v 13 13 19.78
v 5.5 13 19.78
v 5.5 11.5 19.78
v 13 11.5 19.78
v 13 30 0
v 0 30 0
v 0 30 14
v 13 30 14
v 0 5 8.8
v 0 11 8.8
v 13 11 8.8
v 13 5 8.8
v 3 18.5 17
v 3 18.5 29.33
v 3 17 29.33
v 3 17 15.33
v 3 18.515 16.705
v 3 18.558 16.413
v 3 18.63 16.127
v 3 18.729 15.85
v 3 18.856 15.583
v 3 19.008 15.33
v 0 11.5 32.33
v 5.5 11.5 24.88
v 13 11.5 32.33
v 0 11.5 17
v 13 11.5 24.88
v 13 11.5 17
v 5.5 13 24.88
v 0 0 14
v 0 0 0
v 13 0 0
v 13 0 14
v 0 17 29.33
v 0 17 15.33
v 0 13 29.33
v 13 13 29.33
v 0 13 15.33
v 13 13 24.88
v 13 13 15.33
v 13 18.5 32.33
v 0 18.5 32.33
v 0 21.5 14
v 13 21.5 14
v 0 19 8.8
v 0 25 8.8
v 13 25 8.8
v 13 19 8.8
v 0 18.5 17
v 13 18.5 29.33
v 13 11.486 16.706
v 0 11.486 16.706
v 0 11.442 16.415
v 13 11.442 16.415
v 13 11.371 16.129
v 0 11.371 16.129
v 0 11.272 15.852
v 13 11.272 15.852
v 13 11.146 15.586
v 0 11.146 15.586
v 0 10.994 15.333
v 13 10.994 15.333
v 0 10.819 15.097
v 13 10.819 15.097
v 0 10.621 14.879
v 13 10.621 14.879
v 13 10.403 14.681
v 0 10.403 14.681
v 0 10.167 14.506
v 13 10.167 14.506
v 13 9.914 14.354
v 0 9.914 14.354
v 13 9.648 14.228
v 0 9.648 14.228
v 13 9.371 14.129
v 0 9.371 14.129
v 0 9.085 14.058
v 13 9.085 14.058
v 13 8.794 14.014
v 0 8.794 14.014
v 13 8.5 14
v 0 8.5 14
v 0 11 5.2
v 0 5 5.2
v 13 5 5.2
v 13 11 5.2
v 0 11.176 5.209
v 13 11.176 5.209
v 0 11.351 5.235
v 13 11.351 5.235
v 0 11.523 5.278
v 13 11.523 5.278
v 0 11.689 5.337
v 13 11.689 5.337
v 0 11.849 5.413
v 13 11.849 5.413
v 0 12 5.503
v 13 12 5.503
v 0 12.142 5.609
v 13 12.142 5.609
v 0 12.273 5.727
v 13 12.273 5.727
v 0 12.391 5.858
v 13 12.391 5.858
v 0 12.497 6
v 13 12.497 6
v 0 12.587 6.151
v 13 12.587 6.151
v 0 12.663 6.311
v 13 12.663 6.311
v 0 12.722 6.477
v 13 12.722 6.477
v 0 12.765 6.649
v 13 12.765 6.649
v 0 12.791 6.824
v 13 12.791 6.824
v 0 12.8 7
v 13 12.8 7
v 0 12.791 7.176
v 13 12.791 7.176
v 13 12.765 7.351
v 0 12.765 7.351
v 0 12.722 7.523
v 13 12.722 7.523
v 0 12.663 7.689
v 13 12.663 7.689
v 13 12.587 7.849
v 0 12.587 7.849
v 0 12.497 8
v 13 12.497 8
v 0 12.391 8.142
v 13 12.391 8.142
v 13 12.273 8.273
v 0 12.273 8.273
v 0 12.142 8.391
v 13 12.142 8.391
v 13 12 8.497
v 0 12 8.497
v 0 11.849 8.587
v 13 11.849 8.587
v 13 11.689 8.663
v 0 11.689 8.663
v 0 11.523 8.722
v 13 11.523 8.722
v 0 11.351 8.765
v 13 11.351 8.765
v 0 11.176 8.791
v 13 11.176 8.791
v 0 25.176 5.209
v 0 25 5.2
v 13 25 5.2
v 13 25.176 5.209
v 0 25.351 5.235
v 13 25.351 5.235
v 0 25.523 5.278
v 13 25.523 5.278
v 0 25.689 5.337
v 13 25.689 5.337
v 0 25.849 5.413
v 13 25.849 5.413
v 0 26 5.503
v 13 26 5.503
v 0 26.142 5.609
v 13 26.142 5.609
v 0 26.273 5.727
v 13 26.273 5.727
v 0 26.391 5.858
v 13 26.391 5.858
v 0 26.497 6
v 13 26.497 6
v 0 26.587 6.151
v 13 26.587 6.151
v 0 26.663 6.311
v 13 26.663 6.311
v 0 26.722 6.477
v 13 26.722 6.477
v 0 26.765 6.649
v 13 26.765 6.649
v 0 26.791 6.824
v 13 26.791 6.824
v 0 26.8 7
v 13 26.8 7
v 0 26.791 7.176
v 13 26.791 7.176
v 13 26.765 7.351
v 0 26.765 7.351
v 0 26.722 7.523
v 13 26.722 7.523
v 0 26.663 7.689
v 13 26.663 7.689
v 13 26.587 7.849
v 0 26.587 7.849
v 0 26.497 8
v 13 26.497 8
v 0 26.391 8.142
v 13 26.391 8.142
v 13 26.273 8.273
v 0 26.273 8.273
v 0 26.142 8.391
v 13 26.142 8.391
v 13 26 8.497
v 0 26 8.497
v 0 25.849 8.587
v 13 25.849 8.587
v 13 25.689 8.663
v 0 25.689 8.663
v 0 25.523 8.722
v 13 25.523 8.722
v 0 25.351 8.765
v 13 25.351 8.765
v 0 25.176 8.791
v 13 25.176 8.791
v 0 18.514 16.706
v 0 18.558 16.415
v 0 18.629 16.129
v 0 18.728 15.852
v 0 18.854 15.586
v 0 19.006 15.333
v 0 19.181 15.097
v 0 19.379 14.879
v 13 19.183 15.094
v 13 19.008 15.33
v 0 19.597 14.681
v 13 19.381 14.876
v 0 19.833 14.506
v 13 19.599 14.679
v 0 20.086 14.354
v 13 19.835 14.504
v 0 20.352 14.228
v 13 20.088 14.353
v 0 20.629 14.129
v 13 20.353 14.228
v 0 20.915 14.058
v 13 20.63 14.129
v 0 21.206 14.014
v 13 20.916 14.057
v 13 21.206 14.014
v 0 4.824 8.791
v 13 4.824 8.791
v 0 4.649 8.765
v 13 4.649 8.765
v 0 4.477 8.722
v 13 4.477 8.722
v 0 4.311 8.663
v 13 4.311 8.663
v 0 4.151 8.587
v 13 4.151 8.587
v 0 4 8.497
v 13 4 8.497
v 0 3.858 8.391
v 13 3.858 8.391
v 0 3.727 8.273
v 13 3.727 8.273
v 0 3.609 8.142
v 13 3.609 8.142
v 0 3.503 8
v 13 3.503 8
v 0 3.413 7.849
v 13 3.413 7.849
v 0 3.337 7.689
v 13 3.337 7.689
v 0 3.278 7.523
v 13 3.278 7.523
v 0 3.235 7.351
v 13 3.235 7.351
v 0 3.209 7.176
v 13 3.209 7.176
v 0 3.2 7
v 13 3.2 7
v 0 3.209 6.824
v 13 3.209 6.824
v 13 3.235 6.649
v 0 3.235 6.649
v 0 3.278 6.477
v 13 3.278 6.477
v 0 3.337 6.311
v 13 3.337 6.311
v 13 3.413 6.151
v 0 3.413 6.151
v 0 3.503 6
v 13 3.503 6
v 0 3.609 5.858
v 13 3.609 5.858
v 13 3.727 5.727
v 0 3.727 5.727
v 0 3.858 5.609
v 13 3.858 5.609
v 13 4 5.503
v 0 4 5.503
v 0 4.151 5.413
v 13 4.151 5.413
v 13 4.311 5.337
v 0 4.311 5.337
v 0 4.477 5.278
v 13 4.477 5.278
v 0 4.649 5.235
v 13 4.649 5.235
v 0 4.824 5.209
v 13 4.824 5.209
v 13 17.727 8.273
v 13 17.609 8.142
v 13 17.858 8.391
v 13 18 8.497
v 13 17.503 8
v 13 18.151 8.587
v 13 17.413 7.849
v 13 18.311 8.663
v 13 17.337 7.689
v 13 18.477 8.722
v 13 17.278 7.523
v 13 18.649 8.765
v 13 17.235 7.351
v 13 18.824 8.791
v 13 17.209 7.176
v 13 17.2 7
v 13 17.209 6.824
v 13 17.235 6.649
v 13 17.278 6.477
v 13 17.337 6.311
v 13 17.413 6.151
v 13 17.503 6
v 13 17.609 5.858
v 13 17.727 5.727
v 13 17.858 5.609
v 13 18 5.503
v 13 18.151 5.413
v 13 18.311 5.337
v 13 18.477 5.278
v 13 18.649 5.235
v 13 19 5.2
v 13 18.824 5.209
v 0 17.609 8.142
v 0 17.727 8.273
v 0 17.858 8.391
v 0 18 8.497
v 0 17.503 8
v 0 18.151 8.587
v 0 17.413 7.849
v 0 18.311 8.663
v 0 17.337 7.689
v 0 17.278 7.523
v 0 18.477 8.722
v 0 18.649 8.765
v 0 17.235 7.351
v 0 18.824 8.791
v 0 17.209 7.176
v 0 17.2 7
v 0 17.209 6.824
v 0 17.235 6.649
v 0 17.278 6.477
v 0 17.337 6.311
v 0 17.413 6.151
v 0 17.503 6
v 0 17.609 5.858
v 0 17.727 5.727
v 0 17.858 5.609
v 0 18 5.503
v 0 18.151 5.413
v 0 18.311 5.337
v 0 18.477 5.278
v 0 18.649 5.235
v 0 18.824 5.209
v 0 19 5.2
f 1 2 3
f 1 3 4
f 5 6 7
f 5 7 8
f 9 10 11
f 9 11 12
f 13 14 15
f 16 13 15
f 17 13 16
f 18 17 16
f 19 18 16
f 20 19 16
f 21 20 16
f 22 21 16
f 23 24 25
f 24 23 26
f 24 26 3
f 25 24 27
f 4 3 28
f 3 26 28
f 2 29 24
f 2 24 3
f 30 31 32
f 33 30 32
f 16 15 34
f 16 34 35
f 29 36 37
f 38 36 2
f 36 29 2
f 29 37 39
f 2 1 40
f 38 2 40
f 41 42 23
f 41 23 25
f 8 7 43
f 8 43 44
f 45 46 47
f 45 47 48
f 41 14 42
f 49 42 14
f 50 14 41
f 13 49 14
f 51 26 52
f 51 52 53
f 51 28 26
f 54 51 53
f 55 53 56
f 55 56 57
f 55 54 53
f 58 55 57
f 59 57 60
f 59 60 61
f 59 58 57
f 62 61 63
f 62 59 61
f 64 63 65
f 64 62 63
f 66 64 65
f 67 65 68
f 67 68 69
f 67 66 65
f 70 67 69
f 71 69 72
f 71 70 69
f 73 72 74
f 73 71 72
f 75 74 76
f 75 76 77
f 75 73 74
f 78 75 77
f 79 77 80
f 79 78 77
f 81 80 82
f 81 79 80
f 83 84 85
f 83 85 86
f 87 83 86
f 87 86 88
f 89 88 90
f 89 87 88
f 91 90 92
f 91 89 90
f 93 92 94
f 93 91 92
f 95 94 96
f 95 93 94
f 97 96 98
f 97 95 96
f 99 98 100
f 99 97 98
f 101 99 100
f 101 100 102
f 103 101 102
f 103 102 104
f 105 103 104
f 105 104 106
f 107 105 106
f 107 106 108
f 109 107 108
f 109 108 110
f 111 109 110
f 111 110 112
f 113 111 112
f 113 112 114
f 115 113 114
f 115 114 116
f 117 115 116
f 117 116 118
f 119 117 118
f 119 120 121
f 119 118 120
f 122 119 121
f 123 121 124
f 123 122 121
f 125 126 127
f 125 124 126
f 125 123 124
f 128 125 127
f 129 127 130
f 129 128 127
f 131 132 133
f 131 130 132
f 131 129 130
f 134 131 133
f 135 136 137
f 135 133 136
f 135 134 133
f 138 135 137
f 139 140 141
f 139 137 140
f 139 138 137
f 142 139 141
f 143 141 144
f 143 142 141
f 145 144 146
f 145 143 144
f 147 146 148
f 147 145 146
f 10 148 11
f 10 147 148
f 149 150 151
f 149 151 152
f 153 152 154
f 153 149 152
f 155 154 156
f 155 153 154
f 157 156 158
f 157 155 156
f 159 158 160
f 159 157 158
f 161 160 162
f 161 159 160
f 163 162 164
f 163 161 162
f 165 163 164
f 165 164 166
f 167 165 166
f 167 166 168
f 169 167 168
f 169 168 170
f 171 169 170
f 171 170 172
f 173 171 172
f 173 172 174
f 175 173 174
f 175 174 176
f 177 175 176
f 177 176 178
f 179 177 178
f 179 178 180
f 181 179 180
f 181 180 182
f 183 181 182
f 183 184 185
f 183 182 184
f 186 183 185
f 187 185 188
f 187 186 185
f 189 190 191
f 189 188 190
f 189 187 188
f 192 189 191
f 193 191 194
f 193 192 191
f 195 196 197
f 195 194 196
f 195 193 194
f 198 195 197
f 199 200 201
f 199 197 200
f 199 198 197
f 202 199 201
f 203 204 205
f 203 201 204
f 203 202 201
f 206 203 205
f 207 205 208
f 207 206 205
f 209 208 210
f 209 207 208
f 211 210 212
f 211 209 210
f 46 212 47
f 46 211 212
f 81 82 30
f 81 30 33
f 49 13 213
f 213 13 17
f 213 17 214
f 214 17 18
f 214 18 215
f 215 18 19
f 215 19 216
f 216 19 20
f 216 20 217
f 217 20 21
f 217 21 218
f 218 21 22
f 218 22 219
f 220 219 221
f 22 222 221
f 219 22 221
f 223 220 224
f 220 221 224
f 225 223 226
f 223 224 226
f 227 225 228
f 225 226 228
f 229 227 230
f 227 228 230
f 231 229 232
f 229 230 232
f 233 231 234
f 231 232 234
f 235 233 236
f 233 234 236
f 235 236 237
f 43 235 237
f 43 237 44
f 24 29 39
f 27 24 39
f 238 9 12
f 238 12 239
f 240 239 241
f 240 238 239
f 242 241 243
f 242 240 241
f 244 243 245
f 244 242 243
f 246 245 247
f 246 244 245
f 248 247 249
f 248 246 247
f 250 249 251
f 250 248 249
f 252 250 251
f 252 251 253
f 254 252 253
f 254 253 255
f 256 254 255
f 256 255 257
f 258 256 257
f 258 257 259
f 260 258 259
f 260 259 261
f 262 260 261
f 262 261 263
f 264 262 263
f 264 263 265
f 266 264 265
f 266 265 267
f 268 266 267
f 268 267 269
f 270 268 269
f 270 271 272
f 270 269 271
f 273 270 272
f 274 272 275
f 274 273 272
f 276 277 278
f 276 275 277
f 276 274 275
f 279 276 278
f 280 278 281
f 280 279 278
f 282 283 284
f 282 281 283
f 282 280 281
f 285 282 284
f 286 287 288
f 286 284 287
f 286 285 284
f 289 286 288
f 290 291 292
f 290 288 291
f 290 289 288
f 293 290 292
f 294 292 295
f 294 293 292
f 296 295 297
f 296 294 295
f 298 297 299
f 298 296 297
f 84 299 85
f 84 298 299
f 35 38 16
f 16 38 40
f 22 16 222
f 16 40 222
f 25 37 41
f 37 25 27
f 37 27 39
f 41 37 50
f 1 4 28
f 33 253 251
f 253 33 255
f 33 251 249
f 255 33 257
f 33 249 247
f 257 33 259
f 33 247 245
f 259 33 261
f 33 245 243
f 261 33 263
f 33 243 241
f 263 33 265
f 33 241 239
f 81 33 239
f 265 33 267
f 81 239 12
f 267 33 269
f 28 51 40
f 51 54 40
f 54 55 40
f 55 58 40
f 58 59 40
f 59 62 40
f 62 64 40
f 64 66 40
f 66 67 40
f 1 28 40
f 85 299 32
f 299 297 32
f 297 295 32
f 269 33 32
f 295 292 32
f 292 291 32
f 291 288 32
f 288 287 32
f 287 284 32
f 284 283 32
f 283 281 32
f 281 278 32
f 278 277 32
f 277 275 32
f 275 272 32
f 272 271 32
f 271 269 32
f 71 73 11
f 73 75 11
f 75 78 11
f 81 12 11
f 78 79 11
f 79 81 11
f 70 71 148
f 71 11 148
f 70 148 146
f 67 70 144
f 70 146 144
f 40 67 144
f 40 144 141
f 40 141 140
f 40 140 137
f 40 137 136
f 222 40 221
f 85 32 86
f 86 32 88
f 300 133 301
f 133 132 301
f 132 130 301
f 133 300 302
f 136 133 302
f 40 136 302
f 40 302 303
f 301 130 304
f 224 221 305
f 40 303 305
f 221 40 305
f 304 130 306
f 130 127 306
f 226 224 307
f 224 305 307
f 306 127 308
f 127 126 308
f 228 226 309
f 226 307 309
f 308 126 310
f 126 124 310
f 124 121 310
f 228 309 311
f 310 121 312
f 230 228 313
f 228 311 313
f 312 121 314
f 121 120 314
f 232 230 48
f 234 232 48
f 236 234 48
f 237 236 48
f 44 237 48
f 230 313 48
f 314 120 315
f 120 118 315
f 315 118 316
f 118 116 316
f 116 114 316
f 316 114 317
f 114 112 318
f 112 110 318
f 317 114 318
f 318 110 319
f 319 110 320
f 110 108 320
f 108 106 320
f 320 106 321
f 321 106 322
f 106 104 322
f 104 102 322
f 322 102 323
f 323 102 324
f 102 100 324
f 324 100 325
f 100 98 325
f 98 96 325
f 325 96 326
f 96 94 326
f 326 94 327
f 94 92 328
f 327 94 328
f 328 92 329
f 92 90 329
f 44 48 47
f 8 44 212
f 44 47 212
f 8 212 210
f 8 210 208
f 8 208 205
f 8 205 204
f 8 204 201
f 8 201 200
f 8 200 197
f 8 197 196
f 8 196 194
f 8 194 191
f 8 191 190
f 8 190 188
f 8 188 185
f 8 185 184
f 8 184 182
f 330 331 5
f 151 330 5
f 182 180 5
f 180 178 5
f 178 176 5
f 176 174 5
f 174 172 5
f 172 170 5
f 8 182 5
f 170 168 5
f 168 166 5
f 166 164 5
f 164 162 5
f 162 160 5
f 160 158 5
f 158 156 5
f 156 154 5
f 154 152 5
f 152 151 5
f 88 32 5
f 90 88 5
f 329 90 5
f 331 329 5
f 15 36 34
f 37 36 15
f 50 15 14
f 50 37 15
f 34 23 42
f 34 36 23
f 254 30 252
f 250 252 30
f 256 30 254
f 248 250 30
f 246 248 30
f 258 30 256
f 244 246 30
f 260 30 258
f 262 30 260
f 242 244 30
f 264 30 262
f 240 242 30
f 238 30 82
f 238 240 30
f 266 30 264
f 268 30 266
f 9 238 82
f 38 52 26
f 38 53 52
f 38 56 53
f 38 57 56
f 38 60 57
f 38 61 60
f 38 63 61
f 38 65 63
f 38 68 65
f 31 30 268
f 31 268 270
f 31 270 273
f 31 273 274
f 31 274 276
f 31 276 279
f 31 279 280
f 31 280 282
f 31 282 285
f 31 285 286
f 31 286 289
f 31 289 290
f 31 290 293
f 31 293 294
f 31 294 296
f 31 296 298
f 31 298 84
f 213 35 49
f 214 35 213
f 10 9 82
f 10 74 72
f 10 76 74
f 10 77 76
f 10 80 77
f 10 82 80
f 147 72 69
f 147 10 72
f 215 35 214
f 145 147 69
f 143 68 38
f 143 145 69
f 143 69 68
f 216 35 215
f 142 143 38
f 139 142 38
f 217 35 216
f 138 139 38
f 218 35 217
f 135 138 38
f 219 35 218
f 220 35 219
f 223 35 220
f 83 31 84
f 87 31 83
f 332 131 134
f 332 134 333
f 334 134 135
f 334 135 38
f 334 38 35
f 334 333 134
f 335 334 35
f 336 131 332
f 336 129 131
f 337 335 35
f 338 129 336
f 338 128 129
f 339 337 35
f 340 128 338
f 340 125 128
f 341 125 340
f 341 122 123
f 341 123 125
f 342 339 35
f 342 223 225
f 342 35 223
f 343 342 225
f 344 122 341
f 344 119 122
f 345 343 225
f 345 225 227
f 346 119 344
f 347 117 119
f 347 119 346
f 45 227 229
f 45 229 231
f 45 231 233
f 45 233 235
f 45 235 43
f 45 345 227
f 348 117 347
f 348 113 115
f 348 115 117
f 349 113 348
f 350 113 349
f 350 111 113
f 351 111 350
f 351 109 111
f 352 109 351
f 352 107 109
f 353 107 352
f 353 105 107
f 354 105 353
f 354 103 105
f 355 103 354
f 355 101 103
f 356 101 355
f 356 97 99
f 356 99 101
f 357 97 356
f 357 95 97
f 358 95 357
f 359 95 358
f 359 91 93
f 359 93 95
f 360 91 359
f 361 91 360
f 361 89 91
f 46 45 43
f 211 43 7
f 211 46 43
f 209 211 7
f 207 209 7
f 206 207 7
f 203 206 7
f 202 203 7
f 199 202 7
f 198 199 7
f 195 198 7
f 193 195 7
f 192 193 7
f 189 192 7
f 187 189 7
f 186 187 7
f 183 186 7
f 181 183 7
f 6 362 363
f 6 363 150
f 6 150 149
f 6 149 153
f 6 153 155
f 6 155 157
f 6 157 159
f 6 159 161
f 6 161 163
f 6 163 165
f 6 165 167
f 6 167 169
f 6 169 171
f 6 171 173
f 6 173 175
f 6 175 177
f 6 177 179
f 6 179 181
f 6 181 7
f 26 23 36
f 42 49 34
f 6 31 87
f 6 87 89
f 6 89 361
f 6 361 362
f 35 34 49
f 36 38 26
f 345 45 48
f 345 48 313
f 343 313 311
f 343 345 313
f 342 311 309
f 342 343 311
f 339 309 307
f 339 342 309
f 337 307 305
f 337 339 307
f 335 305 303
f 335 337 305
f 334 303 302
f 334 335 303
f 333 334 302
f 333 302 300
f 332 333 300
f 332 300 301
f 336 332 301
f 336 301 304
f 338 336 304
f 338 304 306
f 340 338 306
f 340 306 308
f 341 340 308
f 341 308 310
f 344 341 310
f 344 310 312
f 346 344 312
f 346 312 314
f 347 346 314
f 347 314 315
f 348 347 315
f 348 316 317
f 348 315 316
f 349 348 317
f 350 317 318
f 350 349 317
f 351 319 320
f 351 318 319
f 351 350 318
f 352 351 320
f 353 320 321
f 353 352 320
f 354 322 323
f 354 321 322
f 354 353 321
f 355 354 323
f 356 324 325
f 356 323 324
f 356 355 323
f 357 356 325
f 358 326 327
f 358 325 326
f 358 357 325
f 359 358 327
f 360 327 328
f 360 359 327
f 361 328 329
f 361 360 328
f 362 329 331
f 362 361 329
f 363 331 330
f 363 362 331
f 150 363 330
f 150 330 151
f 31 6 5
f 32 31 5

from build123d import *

# Parameters (mm, degrees)
SKETCH1_W           = 13
SKETCH1_H           = 30
BOSS_EXTRUDE1_DEPTH = 14
SKETCH2_W           = 13
SKETCH2_H           = 7
BOSS_EXTRUDE2_DEPTH = 18.33
SKETCH3_W           = 10
SKETCH3_H           = 14
CUT_EXTRUDE1_DEPTH  = 5.5
SKETCH4_W           = 14
SKETCH4_H           = 4
CUT_EXTRUDE2_DEPTH  = 46.224207014
FILLET1_R           = 3
CUT_EXTRUDE3_DEPTH  = 46.980744883
SKETCH6_W           = 7.5
SKETCH6_H           = 5.1
CUT_EXTRUDE4_DEPTH  = 39.771495973


with BuildPart() as part:
    # Sketch1 → Boss-Extrude1 (new body)
    with BuildSketch(Plane.XY):
        with Locations((6.5, 15)):
            Rectangle(SKETCH1_W, SKETCH1_H)
    extrude(amount=BOSS_EXTRUDE1_DEPTH)

    # Sketch2 → Boss-Extrude2 (add)
    with BuildSketch(Plane.XY.offset(14)):
        with Locations((6.5, 15)):
            Rectangle(SKETCH2_W, SKETCH2_H)
    extrude(amount=BOSS_EXTRUDE2_DEPTH)

    # Sketch3 → Cut-Extrude1 (cut)
    with BuildSketch(Plane(origin=(0, 18.5, 0), x_dir=(1, 0, 0), z_dir=(0, 1, 0))):
        with Locations((8, -22.33)):
            Rectangle(SKETCH3_W, SKETCH3_H)
    extrude(amount=-CUT_EXTRUDE1_DEPTH, mode=Mode.SUBTRACT)

    # Sketch4 → Cut-Extrude2 (cut, through all)
    with BuildSketch(Plane(origin=(3, 0, 0), x_dir=(0, 0, -1), z_dir=(1, 0, 0))):
        with Locations((-22.33, 15)):
            Rectangle(SKETCH4_W, SKETCH4_H)
    extrude(amount=-CUT_EXTRUDE2_DEPTH, mode=Mode.SUBTRACT)

    # Fillet1
    fillet1_edges = [part.edges().sort_by_distance(p)[0] for p in [
        (6.5, 11.5, 14),
        (6.5, 18.5, 14),
    ]]
    fillet(fillet1_edges, radius=FILLET1_R)

    # Sketch5 → Cut-Extrude3 (cut, through all)
    with BuildSketch(Plane.ZY):
        with BuildLine():
            Line((5.2, 5), (5.2, 11))
            ThreePointArc((5.2, 11), (7, 12.8), (8.8, 11))
            Line((8.8, 11), (8.8, 5))
            ThreePointArc((8.8, 5), (7, 3.2), (5.2, 5))
        make_face()
        with BuildLine():
            Line((5.2, 19), (5.2, 25))
            ThreePointArc((5.2, 25), (7, 26.8), (8.8, 25))
            Line((8.8, 25), (8.8, 19))
            ThreePointArc((8.8, 19), (7, 17.2), (5.2, 19))
        make_face()
    extrude(amount=-CUT_EXTRUDE3_DEPTH, mode=Mode.SUBTRACT)

    # Sketch6 → Cut-Extrude4 (cut, through all)
    with BuildSketch(Plane(origin=(0, 13, 0), x_dir=(1, 0, 0), z_dir=(0, 1, 0))):
        with Locations((9.25, -22.33)):
            Rectangle(SKETCH6_W, SKETCH6_H)
    extrude(amount=-CUT_EXTRUDE4_DEPTH, mode=Mode.SUBTRACT)


solid = part.part
